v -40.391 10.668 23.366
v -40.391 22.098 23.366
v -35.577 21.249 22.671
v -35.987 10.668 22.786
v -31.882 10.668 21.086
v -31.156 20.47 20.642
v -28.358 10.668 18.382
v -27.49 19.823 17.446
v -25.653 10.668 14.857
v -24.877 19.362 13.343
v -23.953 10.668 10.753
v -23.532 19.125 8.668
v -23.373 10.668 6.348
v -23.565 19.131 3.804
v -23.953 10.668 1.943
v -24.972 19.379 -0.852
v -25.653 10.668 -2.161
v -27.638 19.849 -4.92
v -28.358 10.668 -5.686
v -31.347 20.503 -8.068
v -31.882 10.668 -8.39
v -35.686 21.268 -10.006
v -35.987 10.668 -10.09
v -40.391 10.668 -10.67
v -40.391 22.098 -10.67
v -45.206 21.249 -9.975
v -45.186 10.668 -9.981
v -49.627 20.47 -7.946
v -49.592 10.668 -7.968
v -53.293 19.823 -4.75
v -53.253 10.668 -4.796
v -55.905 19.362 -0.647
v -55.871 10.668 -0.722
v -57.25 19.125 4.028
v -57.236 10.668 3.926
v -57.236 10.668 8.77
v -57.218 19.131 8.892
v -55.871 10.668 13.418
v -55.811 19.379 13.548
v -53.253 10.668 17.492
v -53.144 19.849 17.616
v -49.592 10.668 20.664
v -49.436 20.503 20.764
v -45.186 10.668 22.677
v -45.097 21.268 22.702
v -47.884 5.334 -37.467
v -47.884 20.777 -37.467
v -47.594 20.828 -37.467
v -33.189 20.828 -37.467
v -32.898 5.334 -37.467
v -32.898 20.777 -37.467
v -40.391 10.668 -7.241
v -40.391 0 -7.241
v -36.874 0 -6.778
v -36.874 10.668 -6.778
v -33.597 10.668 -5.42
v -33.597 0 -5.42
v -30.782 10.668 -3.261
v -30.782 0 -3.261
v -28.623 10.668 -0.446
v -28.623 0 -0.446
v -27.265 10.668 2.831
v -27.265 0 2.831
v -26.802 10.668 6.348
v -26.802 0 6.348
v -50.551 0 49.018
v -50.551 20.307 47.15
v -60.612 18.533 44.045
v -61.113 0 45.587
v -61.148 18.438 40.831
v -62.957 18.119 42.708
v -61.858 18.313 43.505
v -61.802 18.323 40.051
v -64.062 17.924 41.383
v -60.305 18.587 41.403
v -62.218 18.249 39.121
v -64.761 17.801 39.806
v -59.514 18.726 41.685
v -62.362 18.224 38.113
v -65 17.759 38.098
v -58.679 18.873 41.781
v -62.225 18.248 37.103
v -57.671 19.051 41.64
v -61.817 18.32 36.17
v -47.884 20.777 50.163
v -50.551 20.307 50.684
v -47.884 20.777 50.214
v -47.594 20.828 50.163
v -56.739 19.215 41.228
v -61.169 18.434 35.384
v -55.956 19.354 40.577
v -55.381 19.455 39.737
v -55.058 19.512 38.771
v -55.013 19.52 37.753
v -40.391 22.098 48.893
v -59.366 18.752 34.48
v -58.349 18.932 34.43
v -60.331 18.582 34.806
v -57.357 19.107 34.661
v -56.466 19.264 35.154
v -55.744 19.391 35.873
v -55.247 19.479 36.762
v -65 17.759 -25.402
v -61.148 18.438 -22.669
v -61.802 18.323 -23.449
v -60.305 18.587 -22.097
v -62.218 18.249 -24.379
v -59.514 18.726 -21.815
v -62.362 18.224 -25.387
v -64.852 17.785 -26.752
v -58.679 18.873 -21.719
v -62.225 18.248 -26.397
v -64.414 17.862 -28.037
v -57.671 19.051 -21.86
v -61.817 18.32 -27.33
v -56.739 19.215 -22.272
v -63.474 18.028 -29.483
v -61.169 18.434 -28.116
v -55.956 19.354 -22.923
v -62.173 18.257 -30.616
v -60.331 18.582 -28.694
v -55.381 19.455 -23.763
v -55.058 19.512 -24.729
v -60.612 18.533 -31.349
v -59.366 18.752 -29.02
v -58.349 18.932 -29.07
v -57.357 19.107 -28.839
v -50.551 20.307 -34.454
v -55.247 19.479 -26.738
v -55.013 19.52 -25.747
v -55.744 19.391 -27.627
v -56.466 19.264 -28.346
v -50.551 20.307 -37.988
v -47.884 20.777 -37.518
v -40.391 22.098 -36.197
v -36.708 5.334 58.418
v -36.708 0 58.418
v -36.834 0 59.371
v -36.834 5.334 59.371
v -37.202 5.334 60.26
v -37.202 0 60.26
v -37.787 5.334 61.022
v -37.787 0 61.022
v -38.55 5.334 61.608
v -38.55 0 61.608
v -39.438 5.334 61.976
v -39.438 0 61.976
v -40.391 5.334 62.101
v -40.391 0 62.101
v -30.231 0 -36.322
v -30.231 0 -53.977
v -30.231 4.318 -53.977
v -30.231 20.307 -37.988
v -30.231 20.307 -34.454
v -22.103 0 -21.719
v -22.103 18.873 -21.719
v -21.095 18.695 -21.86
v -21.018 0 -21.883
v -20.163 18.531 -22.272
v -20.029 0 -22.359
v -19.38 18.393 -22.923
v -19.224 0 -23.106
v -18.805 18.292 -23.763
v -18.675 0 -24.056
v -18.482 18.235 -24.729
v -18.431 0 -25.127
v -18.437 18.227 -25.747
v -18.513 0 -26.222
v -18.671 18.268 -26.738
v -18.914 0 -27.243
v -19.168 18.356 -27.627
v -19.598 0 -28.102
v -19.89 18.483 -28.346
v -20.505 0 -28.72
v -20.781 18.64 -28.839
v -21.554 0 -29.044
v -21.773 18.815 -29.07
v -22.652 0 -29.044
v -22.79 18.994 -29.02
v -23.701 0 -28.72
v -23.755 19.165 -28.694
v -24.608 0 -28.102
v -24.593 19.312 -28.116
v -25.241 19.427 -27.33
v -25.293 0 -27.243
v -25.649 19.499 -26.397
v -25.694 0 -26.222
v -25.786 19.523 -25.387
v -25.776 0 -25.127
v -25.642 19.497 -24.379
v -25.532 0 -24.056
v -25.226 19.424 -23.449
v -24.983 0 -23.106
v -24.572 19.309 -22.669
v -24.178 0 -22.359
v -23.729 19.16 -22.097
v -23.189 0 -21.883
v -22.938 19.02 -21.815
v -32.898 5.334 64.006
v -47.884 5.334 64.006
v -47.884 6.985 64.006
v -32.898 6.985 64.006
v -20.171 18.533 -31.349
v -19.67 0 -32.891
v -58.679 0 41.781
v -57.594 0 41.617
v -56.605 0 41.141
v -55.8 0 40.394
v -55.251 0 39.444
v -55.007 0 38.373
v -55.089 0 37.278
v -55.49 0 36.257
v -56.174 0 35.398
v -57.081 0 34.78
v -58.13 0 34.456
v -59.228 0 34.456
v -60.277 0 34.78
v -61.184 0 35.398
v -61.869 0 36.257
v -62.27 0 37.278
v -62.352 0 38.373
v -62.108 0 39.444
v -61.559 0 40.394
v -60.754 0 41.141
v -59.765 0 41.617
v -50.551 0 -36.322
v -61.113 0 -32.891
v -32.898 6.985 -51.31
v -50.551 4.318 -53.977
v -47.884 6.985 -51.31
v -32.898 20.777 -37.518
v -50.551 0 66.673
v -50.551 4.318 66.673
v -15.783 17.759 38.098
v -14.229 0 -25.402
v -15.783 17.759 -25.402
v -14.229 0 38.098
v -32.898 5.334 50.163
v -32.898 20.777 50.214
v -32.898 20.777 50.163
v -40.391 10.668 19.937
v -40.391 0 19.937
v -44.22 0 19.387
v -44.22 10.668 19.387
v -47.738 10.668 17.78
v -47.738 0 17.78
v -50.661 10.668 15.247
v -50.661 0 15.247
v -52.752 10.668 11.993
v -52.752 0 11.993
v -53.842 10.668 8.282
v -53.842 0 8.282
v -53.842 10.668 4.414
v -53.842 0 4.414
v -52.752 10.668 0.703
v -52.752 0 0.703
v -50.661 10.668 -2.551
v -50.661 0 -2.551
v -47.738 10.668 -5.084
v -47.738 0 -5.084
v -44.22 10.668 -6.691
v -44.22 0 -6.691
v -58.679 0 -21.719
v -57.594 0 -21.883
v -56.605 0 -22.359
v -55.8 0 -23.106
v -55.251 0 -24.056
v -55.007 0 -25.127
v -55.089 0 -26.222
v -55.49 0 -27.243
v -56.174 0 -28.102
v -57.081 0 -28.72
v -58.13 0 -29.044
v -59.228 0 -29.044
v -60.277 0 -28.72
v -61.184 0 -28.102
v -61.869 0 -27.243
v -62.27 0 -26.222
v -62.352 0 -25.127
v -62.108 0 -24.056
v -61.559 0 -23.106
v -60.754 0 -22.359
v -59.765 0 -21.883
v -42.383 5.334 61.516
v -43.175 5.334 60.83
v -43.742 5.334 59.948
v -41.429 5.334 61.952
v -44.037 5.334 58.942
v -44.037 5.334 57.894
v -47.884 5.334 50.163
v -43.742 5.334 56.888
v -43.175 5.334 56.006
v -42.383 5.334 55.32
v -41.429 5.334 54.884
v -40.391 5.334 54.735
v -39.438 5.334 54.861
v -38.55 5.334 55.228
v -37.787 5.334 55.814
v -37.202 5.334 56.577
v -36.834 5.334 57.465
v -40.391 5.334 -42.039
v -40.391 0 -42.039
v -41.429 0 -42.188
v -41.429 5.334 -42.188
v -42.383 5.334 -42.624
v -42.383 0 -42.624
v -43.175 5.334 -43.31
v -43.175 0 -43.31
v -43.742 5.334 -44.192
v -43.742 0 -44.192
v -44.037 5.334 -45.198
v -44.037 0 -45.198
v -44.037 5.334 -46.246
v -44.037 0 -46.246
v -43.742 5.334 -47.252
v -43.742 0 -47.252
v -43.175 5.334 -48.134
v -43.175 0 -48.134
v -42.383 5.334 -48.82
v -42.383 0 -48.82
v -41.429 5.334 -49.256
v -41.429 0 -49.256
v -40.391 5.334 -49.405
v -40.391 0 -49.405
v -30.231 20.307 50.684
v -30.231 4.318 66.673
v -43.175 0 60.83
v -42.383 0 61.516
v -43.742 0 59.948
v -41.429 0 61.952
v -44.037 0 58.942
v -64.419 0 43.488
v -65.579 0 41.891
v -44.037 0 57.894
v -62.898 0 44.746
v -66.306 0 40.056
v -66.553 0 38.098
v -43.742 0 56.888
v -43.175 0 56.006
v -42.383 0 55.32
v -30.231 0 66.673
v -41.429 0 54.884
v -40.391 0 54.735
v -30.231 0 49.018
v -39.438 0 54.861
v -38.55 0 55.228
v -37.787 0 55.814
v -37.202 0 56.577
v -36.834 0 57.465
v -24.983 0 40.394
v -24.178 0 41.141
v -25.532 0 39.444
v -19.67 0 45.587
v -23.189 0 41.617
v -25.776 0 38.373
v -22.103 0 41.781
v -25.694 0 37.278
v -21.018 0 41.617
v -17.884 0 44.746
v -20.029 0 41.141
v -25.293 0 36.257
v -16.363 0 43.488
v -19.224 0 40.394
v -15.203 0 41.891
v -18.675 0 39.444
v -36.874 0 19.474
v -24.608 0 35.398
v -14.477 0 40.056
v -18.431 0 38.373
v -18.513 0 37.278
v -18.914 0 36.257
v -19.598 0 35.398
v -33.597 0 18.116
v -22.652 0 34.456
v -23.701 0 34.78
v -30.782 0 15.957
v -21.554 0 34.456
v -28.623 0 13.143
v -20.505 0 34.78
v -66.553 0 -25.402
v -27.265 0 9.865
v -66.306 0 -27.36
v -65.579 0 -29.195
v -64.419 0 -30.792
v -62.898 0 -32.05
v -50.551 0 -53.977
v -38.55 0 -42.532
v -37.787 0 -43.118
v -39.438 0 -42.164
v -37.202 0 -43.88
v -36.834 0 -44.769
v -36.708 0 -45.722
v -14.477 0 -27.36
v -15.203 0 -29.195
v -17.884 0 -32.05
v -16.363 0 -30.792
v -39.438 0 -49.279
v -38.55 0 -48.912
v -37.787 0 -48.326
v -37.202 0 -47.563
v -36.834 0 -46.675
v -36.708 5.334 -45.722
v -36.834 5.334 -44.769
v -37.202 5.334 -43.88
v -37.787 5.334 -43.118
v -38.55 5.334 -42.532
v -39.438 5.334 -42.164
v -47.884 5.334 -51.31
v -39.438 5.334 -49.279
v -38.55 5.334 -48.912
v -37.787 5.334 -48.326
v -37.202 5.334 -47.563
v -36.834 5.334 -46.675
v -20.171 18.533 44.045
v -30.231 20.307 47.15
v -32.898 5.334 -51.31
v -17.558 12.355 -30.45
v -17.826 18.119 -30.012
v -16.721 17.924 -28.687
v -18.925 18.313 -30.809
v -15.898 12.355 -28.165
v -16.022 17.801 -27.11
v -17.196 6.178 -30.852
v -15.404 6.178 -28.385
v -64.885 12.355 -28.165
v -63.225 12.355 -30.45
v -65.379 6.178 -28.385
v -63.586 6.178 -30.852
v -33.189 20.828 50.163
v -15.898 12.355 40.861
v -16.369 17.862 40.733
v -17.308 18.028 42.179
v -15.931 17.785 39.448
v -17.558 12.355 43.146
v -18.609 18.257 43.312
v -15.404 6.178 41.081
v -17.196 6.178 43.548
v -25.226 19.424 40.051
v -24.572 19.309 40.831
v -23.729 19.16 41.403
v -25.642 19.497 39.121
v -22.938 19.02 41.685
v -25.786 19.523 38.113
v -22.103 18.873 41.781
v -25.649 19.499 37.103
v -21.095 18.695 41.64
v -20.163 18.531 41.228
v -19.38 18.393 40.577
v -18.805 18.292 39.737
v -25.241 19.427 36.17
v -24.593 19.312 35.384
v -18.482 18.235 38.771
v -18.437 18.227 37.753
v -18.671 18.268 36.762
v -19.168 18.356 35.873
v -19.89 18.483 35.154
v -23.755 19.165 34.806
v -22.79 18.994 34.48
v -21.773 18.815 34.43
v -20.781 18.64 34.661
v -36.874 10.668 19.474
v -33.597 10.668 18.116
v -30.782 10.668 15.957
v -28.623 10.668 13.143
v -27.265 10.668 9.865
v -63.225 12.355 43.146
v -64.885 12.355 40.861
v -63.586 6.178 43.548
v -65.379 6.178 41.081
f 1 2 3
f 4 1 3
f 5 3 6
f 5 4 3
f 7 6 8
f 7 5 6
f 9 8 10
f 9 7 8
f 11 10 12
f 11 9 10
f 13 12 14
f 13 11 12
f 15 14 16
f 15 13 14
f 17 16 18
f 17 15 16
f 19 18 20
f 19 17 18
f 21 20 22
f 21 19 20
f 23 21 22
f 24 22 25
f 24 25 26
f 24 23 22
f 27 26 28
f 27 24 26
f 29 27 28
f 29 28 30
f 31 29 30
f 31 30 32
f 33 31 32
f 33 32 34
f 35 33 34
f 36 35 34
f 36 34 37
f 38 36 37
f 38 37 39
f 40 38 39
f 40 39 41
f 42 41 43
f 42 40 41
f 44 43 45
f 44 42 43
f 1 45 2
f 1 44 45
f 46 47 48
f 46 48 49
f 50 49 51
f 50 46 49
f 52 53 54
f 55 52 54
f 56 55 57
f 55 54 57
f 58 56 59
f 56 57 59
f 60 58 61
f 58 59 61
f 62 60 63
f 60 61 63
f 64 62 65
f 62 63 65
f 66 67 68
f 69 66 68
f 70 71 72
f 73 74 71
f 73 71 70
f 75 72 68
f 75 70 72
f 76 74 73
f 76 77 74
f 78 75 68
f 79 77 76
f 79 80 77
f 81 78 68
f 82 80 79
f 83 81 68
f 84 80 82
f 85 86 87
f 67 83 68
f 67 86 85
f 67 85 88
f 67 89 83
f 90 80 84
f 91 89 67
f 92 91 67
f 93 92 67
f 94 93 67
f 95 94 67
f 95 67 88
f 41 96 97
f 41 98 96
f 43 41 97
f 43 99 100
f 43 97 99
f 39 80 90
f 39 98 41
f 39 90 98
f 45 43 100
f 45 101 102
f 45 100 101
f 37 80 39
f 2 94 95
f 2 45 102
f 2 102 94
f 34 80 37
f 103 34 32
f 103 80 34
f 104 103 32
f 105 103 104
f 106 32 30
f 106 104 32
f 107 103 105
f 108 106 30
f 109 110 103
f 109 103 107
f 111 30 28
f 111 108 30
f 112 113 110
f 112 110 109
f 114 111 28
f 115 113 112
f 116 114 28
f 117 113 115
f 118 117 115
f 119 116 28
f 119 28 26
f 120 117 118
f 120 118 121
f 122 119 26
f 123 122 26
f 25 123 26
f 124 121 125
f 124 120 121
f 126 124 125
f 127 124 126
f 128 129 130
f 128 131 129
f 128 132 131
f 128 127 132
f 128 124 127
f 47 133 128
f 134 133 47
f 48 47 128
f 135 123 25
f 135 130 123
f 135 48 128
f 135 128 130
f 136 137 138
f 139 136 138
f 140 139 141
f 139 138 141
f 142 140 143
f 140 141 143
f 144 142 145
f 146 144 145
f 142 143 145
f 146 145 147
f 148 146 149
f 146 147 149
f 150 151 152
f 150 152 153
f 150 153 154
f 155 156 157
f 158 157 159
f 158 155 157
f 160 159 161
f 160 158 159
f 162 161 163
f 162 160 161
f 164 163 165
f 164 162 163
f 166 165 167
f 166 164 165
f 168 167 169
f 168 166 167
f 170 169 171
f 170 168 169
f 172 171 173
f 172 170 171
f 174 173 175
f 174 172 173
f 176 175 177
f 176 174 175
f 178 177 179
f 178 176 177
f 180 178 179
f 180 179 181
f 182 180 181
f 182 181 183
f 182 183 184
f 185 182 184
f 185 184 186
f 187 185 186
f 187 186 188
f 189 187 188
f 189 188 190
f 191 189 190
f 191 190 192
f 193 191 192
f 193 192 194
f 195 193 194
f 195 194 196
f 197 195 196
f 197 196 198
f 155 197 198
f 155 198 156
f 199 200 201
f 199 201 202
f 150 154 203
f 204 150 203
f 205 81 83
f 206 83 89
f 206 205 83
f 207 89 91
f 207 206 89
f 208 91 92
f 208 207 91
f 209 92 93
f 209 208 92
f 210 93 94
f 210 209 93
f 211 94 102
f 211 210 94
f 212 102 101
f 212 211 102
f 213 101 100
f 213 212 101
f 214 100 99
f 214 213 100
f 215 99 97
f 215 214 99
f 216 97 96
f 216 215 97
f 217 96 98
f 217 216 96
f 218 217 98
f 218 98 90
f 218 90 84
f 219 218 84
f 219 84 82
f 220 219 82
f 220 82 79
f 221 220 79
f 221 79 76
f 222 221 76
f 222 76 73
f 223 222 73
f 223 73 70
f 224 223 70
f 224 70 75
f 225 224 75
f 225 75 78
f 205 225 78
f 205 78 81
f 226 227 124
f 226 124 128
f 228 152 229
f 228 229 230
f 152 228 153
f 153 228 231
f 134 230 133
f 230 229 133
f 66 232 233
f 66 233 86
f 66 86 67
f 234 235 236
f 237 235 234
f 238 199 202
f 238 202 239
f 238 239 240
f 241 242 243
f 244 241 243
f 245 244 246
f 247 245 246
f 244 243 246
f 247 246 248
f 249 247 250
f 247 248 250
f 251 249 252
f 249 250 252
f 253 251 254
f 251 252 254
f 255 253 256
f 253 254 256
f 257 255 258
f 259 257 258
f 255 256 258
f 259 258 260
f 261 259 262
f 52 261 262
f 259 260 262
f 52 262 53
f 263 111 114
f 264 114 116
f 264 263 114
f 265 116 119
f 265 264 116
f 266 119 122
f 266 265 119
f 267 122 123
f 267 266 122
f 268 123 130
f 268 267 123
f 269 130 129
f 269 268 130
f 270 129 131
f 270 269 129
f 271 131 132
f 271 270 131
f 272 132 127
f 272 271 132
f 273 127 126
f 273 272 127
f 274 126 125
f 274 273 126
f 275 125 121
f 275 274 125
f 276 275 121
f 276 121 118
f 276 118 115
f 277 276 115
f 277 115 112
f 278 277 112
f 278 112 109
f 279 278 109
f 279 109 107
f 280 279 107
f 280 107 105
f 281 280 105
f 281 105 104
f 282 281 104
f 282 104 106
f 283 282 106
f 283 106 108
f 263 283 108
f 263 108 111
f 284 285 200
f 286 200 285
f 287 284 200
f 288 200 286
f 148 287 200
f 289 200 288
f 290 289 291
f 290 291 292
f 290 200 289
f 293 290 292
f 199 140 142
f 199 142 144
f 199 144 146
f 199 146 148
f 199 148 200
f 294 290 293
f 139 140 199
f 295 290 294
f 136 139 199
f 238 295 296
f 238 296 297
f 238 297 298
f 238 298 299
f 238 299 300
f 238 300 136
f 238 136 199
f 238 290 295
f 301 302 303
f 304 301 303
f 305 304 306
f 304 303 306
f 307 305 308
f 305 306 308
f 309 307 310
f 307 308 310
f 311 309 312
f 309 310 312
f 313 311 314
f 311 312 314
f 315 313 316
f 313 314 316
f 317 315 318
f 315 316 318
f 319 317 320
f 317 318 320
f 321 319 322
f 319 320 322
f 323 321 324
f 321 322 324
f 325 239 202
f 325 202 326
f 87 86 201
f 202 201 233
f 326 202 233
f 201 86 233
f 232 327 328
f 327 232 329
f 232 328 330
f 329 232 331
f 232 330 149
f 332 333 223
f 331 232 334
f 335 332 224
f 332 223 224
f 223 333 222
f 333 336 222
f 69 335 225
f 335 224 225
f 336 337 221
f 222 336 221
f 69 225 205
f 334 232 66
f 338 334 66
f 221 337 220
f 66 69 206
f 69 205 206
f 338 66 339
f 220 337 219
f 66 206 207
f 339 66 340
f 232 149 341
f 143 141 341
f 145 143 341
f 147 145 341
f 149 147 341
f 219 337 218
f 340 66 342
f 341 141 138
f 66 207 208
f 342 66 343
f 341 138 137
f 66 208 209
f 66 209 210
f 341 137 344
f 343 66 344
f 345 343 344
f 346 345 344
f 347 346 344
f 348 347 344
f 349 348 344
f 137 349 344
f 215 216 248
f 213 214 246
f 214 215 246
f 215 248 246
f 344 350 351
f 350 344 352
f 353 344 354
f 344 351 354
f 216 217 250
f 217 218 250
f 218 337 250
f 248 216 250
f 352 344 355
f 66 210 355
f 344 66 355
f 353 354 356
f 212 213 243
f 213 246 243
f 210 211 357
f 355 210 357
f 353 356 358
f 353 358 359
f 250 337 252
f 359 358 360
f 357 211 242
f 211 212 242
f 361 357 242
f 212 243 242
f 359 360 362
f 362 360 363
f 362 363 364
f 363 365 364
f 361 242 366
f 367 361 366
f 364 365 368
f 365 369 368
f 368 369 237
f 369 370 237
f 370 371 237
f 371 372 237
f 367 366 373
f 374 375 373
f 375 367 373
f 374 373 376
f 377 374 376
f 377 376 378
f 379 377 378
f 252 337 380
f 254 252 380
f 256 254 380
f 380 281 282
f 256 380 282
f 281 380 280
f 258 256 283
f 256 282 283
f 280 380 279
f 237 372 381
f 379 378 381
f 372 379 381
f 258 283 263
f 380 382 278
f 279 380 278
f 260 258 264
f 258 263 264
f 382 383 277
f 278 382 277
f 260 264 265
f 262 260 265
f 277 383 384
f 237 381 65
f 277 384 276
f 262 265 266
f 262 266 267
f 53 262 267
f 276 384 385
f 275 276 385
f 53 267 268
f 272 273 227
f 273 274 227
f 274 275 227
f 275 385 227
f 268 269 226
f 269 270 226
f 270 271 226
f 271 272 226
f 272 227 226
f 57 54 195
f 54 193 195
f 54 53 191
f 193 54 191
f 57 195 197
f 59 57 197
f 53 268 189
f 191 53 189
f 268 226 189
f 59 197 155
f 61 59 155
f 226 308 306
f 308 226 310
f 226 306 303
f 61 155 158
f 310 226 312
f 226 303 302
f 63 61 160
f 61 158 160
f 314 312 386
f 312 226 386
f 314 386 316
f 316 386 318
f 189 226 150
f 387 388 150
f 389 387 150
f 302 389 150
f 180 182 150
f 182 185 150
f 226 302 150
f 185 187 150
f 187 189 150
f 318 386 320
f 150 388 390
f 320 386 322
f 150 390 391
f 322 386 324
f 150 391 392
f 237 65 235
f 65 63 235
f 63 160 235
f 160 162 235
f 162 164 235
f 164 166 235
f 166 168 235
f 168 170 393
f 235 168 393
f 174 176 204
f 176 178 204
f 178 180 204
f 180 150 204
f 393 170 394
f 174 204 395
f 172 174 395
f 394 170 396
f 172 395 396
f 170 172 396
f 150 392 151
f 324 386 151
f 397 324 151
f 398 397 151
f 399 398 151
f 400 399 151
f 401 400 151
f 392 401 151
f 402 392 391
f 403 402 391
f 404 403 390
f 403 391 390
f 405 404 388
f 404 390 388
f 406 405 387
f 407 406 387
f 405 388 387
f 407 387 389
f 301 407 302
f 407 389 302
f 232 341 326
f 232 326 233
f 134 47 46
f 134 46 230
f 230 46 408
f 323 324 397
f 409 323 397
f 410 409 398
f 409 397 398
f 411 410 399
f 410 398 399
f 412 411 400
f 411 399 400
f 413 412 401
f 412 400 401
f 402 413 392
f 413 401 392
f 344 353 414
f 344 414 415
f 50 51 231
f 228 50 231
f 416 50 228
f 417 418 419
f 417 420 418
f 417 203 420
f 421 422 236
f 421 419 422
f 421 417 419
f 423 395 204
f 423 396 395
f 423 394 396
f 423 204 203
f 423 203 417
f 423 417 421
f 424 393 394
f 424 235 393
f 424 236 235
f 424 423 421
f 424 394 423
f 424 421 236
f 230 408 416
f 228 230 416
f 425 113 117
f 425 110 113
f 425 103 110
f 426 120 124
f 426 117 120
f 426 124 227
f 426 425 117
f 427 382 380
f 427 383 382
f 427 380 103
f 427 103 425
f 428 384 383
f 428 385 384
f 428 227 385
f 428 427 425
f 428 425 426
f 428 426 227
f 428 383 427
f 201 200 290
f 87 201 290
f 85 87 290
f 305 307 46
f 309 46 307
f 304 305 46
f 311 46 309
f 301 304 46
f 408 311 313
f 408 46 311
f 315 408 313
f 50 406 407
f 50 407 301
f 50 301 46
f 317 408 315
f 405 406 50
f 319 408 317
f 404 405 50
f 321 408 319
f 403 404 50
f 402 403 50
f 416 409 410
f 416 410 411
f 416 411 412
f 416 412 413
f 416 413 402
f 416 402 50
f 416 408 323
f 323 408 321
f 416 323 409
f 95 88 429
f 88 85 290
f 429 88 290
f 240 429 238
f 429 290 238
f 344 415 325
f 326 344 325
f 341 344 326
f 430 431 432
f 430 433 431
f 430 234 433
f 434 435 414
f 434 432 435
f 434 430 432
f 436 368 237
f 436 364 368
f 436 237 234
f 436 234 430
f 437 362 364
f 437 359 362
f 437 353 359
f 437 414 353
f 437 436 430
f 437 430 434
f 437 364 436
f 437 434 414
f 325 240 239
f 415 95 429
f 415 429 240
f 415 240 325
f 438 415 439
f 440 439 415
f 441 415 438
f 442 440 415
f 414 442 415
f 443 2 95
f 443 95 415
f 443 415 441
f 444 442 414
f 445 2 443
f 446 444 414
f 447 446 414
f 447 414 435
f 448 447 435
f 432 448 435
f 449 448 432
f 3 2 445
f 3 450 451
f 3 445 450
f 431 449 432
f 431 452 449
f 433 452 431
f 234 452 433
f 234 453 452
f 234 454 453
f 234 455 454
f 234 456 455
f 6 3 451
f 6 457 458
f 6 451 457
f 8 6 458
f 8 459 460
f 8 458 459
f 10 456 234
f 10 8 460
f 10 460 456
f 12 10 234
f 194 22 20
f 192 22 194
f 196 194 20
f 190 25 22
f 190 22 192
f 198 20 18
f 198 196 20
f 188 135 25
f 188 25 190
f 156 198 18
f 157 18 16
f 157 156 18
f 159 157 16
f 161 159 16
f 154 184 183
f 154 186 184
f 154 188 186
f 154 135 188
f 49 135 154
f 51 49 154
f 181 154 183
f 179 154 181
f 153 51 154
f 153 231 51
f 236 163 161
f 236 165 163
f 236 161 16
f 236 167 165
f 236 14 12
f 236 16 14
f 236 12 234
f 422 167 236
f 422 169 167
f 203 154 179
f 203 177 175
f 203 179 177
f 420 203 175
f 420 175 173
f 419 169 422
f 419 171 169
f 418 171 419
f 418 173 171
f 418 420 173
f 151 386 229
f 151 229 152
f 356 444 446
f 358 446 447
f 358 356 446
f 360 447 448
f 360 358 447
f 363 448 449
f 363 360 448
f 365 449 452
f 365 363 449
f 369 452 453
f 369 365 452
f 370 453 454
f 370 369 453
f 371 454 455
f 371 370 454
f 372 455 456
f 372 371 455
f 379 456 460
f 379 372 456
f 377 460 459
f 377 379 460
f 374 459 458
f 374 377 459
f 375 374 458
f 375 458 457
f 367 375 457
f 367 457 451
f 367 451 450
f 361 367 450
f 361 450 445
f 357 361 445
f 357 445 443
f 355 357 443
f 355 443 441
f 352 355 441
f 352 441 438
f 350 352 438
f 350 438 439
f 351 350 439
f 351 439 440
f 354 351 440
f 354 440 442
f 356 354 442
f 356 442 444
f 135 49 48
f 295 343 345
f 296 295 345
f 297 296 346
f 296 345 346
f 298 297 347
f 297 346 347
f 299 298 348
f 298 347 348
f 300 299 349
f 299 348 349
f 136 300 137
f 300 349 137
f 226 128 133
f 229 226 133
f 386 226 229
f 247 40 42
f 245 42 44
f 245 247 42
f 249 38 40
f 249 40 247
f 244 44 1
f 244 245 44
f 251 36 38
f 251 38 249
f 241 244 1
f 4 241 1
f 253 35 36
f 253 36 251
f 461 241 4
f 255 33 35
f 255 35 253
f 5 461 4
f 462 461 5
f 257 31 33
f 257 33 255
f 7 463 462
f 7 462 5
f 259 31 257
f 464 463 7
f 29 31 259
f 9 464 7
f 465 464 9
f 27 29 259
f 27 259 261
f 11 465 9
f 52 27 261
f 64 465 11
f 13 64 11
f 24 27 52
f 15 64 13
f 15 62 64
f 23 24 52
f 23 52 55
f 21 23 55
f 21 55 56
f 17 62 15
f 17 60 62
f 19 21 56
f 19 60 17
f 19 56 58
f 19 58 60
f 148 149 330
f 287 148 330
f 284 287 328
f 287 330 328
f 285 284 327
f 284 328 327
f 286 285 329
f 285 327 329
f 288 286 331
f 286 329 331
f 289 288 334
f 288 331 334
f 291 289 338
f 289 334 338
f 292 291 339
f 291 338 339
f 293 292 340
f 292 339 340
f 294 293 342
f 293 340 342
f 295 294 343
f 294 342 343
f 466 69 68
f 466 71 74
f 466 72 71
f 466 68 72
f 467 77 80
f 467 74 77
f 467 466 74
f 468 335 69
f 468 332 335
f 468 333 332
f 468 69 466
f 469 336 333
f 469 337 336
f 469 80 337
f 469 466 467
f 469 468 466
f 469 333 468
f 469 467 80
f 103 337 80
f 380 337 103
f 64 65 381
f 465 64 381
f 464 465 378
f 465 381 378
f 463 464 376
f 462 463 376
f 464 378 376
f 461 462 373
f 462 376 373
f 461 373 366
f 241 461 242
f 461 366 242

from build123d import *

# Parameters (mm, degrees)
SKETCH1_R               = 3.683
SKETCH1_W               = 14.986
SKETCH1_H               = 13.843
SKETCH1_R_2             = 17.018
BOSS_EXTRUDE2_DEPTH     = 22.098
DRAFT2_ANGLE            = -5
SKETCH1_4_W             = 14.986
SKETCH1_4_H             = 13.843
SKETCH1_4_R             = 3.683
BOSS_EXTRUDE3_DEPTH     = 5.334
CUT_EXTRUDE1_DEPTH      = 97.762405579
CUT_EXTRUDE1_DEPTH_BACK = 97.762405579
CUT_EXTRUDE2_DEPTH      = 97.762405579
CUT_EXTRUDE2_DEPTH_BACK = 97.762405579
SKETCH1_5_R             = 17.018
SKETCH1_5_R_2           = 13.589
BOSS_EXTRUDE4_DEPTH     = 10.668


with BuildPart() as part:
    # Sketch1 → Boss-Extrude2 (new body)
    with BuildSketch(Plane(origin=(0, 0, 0), x_dir=(1, 0, 0), z_dir=(0, 1, 0))):
        with BuildLine():
            Line((-30.231365501, 53.976983945), (-50.551365501, 53.976983945))
            Line((-50.551365501, 53.976983945), (-50.551365501, 36.322144789))
            Line((-50.551365501, 36.322144789), (-61.112565315, 32.890602954))
            ThreePointArc((-61.112565315, 32.890602954), (-65.049565315, 30.030205021), (-66.553365501, 25.401983945))
            Line((-66.553365501, 25.401983945), (-66.553365501, -38.098016055))
            ThreePointArc((-66.553365501, -38.098016055), (-65.049565315, -42.726237132), (-61.112565315, -45.586635064))
            Line((-61.112565315, -45.586635064), (-50.551365501, -49.0181769))
            Line((-50.551365501, -49.0181769), (-50.551365501, -66.673016055))
            Line((-50.551365501, -66.673016055), (-30.231365501, -66.673016055))
            Line((-30.231365501, -66.673016055), (-30.231365501, -49.0181769))
            Line((-30.231365501, -49.0181769), (-19.670165688, -45.586635064))
            ThreePointArc((-19.670165688, -45.586635064), (-15.733165688, -42.726237132), (-14.229365501, -38.098016055))
            Line((-14.229365501, -38.098016055), (-14.229365501, 25.401983945))
            ThreePointArc((-14.229365501, 25.401983945), (-15.733165688, 30.030205021), (-19.670165688, 32.890602954))
            Line((-19.670165688, 32.890602954), (-30.231365501, 36.322144789))
            Line((-30.231365501, 36.322144789), (-30.231365501, 53.976983945))
        make_face()
        with Locations((-58.679365501, -38.098016055)):
            Circle(SKETCH1_R, mode=Mode.SUBTRACT)
        with Locations((-40.391365501, -57.084516055)):
            Rectangle(SKETCH1_W, SKETCH1_H, mode=Mode.SUBTRACT)
        with Locations((-22.103365501, -38.098016055)):
            Circle(SKETCH1_R, mode=Mode.SUBTRACT)
        with Locations((-40.391365501, -6.348016055)):
            Circle(SKETCH1_R_2, mode=Mode.SUBTRACT)
        with Locations((-58.679365501, 25.401983945)):
            Circle(SKETCH1_R, mode=Mode.SUBTRACT)
        with Locations((-40.391365501, 44.388483945)):
            Rectangle(SKETCH1_W, SKETCH1_H, mode=Mode.SUBTRACT)
        with Locations((-22.103365501, 25.401983945)):
            Circle(SKETCH1_R, mode=Mode.SUBTRACT)
    extrude(amount=BOSS_EXTRUDE2_DEPTH)

    # Draft2
    draft2_faces = [part.faces().sort_by_distance(p)[0] for p in [
        (-55.831965408, 11.049, -34.606373872),
        (-65.049565315, 11.049, -30.030205021),
        (-66.553365501, 11.049, 6.348016055),
        (-65.049565315, 11.049, 42.726237132),
        (-55.831965408, 11.049, 47.302405982),
        (-15.733165688, 11.049, 42.726237132),
        (-24.950765594, 11.049, 47.302405982),
        (-24.950765594, 11.049, -34.606373872),
        (-15.733165688, 11.049, -30.030205021),
        (-14.229365501, 11.049, 6.348016055),
    ]]
    draft(draft2_faces, Plane(origin=(0, 0, 0), x_dir=(0, 0, -1), z_dir=(0, -1, 0)), DRAFT2_ANGLE)

    # Sketch1<4> → Boss-Extrude3 (add)
    # profile 1 of 2: a face of its own
    with BuildSketch(Plane(origin=(0, 0, 0), x_dir=(1, 0, 0), z_dir=(0, 1, 0))):
        with Locations((-40.391365501, 44.388483945)):
            Rectangle(SKETCH1_4_W, SKETCH1_4_H)
        with Locations((-40.391365501, 45.721983945)):
            Circle(SKETCH1_4_R, mode=Mode.SUBTRACT)
    # profile 2 of 2: a face of its own
    with BuildSketch(Plane(origin=(0, 0, 0), x_dir=(1, 0, 0), z_dir=(0, 1, 0))):
        with Locations((-40.391365501, -57.084516055)):
            Rectangle(SKETCH1_4_W, SKETCH1_4_H)
        with Locations((-40.391365501, -58.418016055)):
            Circle(SKETCH1_4_R, mode=Mode.SUBTRACT)
    extrude(amount=BOSS_EXTRUDE3_DEPTH)

    # Sketch2 → Cut-Extrude1 (cut, two sides: drawn at the far end of the back side and taken through both)
    with BuildSketch(Plane(origin=(0, 0, 0), x_dir=(0, 0, -1), z_dir=(1, 0, 0)).offset(-CUT_EXTRUDE1_DEPTH_BACK)):
        Polygon((-66.673016055, 4.318), (-66.673016055, 22.098), (-48.893016055, 22.098), align=None)
        Polygon((36.196983945, 22.098), (53.976983945, 22.098), (53.976983945, 4.318), align=None)
    extrude(amount=CUT_EXTRUDE1_DEPTH + CUT_EXTRUDE1_DEPTH_BACK, mode=Mode.SUBTRACT)

    # Sketch3 → Cut-Extrude2 (cut, two sides: drawn at the far end of the back side and taken through both)
    with BuildSketch(Plane.XY.offset(-CUT_EXTRUDE2_DEPTH_BACK)):
        Polygon((-16.162689988, 22.098), (-40.391365501, 22.098), (-15.783067323, 17.758893082), align=None)
        Polygon((-40.391365501, 22.098), (-64.620041015, 22.098), (-64.99966368, 17.758893082), align=None)
    extrude(amount=CUT_EXTRUDE2_DEPTH + CUT_EXTRUDE2_DEPTH_BACK, mode=Mode.SUBTRACT)

    # Sketch1<5> → Boss-Extrude4 (add)
    with BuildSketch(Plane(origin=(0, 0, 0), x_dir=(1, 0, 0), z_dir=(0, 1, 0))):
        with Locations((-40.391365501, -6.348016055)):
            Circle(SKETCH1_5_R)
        with Locations((-40.391365501, -6.348016055)):
            Circle(SKETCH1_5_R_2, mode=Mode.SUBTRACT)
    extrude(amount=BOSS_EXTRUDE4_DEPTH)


solid = part.part
